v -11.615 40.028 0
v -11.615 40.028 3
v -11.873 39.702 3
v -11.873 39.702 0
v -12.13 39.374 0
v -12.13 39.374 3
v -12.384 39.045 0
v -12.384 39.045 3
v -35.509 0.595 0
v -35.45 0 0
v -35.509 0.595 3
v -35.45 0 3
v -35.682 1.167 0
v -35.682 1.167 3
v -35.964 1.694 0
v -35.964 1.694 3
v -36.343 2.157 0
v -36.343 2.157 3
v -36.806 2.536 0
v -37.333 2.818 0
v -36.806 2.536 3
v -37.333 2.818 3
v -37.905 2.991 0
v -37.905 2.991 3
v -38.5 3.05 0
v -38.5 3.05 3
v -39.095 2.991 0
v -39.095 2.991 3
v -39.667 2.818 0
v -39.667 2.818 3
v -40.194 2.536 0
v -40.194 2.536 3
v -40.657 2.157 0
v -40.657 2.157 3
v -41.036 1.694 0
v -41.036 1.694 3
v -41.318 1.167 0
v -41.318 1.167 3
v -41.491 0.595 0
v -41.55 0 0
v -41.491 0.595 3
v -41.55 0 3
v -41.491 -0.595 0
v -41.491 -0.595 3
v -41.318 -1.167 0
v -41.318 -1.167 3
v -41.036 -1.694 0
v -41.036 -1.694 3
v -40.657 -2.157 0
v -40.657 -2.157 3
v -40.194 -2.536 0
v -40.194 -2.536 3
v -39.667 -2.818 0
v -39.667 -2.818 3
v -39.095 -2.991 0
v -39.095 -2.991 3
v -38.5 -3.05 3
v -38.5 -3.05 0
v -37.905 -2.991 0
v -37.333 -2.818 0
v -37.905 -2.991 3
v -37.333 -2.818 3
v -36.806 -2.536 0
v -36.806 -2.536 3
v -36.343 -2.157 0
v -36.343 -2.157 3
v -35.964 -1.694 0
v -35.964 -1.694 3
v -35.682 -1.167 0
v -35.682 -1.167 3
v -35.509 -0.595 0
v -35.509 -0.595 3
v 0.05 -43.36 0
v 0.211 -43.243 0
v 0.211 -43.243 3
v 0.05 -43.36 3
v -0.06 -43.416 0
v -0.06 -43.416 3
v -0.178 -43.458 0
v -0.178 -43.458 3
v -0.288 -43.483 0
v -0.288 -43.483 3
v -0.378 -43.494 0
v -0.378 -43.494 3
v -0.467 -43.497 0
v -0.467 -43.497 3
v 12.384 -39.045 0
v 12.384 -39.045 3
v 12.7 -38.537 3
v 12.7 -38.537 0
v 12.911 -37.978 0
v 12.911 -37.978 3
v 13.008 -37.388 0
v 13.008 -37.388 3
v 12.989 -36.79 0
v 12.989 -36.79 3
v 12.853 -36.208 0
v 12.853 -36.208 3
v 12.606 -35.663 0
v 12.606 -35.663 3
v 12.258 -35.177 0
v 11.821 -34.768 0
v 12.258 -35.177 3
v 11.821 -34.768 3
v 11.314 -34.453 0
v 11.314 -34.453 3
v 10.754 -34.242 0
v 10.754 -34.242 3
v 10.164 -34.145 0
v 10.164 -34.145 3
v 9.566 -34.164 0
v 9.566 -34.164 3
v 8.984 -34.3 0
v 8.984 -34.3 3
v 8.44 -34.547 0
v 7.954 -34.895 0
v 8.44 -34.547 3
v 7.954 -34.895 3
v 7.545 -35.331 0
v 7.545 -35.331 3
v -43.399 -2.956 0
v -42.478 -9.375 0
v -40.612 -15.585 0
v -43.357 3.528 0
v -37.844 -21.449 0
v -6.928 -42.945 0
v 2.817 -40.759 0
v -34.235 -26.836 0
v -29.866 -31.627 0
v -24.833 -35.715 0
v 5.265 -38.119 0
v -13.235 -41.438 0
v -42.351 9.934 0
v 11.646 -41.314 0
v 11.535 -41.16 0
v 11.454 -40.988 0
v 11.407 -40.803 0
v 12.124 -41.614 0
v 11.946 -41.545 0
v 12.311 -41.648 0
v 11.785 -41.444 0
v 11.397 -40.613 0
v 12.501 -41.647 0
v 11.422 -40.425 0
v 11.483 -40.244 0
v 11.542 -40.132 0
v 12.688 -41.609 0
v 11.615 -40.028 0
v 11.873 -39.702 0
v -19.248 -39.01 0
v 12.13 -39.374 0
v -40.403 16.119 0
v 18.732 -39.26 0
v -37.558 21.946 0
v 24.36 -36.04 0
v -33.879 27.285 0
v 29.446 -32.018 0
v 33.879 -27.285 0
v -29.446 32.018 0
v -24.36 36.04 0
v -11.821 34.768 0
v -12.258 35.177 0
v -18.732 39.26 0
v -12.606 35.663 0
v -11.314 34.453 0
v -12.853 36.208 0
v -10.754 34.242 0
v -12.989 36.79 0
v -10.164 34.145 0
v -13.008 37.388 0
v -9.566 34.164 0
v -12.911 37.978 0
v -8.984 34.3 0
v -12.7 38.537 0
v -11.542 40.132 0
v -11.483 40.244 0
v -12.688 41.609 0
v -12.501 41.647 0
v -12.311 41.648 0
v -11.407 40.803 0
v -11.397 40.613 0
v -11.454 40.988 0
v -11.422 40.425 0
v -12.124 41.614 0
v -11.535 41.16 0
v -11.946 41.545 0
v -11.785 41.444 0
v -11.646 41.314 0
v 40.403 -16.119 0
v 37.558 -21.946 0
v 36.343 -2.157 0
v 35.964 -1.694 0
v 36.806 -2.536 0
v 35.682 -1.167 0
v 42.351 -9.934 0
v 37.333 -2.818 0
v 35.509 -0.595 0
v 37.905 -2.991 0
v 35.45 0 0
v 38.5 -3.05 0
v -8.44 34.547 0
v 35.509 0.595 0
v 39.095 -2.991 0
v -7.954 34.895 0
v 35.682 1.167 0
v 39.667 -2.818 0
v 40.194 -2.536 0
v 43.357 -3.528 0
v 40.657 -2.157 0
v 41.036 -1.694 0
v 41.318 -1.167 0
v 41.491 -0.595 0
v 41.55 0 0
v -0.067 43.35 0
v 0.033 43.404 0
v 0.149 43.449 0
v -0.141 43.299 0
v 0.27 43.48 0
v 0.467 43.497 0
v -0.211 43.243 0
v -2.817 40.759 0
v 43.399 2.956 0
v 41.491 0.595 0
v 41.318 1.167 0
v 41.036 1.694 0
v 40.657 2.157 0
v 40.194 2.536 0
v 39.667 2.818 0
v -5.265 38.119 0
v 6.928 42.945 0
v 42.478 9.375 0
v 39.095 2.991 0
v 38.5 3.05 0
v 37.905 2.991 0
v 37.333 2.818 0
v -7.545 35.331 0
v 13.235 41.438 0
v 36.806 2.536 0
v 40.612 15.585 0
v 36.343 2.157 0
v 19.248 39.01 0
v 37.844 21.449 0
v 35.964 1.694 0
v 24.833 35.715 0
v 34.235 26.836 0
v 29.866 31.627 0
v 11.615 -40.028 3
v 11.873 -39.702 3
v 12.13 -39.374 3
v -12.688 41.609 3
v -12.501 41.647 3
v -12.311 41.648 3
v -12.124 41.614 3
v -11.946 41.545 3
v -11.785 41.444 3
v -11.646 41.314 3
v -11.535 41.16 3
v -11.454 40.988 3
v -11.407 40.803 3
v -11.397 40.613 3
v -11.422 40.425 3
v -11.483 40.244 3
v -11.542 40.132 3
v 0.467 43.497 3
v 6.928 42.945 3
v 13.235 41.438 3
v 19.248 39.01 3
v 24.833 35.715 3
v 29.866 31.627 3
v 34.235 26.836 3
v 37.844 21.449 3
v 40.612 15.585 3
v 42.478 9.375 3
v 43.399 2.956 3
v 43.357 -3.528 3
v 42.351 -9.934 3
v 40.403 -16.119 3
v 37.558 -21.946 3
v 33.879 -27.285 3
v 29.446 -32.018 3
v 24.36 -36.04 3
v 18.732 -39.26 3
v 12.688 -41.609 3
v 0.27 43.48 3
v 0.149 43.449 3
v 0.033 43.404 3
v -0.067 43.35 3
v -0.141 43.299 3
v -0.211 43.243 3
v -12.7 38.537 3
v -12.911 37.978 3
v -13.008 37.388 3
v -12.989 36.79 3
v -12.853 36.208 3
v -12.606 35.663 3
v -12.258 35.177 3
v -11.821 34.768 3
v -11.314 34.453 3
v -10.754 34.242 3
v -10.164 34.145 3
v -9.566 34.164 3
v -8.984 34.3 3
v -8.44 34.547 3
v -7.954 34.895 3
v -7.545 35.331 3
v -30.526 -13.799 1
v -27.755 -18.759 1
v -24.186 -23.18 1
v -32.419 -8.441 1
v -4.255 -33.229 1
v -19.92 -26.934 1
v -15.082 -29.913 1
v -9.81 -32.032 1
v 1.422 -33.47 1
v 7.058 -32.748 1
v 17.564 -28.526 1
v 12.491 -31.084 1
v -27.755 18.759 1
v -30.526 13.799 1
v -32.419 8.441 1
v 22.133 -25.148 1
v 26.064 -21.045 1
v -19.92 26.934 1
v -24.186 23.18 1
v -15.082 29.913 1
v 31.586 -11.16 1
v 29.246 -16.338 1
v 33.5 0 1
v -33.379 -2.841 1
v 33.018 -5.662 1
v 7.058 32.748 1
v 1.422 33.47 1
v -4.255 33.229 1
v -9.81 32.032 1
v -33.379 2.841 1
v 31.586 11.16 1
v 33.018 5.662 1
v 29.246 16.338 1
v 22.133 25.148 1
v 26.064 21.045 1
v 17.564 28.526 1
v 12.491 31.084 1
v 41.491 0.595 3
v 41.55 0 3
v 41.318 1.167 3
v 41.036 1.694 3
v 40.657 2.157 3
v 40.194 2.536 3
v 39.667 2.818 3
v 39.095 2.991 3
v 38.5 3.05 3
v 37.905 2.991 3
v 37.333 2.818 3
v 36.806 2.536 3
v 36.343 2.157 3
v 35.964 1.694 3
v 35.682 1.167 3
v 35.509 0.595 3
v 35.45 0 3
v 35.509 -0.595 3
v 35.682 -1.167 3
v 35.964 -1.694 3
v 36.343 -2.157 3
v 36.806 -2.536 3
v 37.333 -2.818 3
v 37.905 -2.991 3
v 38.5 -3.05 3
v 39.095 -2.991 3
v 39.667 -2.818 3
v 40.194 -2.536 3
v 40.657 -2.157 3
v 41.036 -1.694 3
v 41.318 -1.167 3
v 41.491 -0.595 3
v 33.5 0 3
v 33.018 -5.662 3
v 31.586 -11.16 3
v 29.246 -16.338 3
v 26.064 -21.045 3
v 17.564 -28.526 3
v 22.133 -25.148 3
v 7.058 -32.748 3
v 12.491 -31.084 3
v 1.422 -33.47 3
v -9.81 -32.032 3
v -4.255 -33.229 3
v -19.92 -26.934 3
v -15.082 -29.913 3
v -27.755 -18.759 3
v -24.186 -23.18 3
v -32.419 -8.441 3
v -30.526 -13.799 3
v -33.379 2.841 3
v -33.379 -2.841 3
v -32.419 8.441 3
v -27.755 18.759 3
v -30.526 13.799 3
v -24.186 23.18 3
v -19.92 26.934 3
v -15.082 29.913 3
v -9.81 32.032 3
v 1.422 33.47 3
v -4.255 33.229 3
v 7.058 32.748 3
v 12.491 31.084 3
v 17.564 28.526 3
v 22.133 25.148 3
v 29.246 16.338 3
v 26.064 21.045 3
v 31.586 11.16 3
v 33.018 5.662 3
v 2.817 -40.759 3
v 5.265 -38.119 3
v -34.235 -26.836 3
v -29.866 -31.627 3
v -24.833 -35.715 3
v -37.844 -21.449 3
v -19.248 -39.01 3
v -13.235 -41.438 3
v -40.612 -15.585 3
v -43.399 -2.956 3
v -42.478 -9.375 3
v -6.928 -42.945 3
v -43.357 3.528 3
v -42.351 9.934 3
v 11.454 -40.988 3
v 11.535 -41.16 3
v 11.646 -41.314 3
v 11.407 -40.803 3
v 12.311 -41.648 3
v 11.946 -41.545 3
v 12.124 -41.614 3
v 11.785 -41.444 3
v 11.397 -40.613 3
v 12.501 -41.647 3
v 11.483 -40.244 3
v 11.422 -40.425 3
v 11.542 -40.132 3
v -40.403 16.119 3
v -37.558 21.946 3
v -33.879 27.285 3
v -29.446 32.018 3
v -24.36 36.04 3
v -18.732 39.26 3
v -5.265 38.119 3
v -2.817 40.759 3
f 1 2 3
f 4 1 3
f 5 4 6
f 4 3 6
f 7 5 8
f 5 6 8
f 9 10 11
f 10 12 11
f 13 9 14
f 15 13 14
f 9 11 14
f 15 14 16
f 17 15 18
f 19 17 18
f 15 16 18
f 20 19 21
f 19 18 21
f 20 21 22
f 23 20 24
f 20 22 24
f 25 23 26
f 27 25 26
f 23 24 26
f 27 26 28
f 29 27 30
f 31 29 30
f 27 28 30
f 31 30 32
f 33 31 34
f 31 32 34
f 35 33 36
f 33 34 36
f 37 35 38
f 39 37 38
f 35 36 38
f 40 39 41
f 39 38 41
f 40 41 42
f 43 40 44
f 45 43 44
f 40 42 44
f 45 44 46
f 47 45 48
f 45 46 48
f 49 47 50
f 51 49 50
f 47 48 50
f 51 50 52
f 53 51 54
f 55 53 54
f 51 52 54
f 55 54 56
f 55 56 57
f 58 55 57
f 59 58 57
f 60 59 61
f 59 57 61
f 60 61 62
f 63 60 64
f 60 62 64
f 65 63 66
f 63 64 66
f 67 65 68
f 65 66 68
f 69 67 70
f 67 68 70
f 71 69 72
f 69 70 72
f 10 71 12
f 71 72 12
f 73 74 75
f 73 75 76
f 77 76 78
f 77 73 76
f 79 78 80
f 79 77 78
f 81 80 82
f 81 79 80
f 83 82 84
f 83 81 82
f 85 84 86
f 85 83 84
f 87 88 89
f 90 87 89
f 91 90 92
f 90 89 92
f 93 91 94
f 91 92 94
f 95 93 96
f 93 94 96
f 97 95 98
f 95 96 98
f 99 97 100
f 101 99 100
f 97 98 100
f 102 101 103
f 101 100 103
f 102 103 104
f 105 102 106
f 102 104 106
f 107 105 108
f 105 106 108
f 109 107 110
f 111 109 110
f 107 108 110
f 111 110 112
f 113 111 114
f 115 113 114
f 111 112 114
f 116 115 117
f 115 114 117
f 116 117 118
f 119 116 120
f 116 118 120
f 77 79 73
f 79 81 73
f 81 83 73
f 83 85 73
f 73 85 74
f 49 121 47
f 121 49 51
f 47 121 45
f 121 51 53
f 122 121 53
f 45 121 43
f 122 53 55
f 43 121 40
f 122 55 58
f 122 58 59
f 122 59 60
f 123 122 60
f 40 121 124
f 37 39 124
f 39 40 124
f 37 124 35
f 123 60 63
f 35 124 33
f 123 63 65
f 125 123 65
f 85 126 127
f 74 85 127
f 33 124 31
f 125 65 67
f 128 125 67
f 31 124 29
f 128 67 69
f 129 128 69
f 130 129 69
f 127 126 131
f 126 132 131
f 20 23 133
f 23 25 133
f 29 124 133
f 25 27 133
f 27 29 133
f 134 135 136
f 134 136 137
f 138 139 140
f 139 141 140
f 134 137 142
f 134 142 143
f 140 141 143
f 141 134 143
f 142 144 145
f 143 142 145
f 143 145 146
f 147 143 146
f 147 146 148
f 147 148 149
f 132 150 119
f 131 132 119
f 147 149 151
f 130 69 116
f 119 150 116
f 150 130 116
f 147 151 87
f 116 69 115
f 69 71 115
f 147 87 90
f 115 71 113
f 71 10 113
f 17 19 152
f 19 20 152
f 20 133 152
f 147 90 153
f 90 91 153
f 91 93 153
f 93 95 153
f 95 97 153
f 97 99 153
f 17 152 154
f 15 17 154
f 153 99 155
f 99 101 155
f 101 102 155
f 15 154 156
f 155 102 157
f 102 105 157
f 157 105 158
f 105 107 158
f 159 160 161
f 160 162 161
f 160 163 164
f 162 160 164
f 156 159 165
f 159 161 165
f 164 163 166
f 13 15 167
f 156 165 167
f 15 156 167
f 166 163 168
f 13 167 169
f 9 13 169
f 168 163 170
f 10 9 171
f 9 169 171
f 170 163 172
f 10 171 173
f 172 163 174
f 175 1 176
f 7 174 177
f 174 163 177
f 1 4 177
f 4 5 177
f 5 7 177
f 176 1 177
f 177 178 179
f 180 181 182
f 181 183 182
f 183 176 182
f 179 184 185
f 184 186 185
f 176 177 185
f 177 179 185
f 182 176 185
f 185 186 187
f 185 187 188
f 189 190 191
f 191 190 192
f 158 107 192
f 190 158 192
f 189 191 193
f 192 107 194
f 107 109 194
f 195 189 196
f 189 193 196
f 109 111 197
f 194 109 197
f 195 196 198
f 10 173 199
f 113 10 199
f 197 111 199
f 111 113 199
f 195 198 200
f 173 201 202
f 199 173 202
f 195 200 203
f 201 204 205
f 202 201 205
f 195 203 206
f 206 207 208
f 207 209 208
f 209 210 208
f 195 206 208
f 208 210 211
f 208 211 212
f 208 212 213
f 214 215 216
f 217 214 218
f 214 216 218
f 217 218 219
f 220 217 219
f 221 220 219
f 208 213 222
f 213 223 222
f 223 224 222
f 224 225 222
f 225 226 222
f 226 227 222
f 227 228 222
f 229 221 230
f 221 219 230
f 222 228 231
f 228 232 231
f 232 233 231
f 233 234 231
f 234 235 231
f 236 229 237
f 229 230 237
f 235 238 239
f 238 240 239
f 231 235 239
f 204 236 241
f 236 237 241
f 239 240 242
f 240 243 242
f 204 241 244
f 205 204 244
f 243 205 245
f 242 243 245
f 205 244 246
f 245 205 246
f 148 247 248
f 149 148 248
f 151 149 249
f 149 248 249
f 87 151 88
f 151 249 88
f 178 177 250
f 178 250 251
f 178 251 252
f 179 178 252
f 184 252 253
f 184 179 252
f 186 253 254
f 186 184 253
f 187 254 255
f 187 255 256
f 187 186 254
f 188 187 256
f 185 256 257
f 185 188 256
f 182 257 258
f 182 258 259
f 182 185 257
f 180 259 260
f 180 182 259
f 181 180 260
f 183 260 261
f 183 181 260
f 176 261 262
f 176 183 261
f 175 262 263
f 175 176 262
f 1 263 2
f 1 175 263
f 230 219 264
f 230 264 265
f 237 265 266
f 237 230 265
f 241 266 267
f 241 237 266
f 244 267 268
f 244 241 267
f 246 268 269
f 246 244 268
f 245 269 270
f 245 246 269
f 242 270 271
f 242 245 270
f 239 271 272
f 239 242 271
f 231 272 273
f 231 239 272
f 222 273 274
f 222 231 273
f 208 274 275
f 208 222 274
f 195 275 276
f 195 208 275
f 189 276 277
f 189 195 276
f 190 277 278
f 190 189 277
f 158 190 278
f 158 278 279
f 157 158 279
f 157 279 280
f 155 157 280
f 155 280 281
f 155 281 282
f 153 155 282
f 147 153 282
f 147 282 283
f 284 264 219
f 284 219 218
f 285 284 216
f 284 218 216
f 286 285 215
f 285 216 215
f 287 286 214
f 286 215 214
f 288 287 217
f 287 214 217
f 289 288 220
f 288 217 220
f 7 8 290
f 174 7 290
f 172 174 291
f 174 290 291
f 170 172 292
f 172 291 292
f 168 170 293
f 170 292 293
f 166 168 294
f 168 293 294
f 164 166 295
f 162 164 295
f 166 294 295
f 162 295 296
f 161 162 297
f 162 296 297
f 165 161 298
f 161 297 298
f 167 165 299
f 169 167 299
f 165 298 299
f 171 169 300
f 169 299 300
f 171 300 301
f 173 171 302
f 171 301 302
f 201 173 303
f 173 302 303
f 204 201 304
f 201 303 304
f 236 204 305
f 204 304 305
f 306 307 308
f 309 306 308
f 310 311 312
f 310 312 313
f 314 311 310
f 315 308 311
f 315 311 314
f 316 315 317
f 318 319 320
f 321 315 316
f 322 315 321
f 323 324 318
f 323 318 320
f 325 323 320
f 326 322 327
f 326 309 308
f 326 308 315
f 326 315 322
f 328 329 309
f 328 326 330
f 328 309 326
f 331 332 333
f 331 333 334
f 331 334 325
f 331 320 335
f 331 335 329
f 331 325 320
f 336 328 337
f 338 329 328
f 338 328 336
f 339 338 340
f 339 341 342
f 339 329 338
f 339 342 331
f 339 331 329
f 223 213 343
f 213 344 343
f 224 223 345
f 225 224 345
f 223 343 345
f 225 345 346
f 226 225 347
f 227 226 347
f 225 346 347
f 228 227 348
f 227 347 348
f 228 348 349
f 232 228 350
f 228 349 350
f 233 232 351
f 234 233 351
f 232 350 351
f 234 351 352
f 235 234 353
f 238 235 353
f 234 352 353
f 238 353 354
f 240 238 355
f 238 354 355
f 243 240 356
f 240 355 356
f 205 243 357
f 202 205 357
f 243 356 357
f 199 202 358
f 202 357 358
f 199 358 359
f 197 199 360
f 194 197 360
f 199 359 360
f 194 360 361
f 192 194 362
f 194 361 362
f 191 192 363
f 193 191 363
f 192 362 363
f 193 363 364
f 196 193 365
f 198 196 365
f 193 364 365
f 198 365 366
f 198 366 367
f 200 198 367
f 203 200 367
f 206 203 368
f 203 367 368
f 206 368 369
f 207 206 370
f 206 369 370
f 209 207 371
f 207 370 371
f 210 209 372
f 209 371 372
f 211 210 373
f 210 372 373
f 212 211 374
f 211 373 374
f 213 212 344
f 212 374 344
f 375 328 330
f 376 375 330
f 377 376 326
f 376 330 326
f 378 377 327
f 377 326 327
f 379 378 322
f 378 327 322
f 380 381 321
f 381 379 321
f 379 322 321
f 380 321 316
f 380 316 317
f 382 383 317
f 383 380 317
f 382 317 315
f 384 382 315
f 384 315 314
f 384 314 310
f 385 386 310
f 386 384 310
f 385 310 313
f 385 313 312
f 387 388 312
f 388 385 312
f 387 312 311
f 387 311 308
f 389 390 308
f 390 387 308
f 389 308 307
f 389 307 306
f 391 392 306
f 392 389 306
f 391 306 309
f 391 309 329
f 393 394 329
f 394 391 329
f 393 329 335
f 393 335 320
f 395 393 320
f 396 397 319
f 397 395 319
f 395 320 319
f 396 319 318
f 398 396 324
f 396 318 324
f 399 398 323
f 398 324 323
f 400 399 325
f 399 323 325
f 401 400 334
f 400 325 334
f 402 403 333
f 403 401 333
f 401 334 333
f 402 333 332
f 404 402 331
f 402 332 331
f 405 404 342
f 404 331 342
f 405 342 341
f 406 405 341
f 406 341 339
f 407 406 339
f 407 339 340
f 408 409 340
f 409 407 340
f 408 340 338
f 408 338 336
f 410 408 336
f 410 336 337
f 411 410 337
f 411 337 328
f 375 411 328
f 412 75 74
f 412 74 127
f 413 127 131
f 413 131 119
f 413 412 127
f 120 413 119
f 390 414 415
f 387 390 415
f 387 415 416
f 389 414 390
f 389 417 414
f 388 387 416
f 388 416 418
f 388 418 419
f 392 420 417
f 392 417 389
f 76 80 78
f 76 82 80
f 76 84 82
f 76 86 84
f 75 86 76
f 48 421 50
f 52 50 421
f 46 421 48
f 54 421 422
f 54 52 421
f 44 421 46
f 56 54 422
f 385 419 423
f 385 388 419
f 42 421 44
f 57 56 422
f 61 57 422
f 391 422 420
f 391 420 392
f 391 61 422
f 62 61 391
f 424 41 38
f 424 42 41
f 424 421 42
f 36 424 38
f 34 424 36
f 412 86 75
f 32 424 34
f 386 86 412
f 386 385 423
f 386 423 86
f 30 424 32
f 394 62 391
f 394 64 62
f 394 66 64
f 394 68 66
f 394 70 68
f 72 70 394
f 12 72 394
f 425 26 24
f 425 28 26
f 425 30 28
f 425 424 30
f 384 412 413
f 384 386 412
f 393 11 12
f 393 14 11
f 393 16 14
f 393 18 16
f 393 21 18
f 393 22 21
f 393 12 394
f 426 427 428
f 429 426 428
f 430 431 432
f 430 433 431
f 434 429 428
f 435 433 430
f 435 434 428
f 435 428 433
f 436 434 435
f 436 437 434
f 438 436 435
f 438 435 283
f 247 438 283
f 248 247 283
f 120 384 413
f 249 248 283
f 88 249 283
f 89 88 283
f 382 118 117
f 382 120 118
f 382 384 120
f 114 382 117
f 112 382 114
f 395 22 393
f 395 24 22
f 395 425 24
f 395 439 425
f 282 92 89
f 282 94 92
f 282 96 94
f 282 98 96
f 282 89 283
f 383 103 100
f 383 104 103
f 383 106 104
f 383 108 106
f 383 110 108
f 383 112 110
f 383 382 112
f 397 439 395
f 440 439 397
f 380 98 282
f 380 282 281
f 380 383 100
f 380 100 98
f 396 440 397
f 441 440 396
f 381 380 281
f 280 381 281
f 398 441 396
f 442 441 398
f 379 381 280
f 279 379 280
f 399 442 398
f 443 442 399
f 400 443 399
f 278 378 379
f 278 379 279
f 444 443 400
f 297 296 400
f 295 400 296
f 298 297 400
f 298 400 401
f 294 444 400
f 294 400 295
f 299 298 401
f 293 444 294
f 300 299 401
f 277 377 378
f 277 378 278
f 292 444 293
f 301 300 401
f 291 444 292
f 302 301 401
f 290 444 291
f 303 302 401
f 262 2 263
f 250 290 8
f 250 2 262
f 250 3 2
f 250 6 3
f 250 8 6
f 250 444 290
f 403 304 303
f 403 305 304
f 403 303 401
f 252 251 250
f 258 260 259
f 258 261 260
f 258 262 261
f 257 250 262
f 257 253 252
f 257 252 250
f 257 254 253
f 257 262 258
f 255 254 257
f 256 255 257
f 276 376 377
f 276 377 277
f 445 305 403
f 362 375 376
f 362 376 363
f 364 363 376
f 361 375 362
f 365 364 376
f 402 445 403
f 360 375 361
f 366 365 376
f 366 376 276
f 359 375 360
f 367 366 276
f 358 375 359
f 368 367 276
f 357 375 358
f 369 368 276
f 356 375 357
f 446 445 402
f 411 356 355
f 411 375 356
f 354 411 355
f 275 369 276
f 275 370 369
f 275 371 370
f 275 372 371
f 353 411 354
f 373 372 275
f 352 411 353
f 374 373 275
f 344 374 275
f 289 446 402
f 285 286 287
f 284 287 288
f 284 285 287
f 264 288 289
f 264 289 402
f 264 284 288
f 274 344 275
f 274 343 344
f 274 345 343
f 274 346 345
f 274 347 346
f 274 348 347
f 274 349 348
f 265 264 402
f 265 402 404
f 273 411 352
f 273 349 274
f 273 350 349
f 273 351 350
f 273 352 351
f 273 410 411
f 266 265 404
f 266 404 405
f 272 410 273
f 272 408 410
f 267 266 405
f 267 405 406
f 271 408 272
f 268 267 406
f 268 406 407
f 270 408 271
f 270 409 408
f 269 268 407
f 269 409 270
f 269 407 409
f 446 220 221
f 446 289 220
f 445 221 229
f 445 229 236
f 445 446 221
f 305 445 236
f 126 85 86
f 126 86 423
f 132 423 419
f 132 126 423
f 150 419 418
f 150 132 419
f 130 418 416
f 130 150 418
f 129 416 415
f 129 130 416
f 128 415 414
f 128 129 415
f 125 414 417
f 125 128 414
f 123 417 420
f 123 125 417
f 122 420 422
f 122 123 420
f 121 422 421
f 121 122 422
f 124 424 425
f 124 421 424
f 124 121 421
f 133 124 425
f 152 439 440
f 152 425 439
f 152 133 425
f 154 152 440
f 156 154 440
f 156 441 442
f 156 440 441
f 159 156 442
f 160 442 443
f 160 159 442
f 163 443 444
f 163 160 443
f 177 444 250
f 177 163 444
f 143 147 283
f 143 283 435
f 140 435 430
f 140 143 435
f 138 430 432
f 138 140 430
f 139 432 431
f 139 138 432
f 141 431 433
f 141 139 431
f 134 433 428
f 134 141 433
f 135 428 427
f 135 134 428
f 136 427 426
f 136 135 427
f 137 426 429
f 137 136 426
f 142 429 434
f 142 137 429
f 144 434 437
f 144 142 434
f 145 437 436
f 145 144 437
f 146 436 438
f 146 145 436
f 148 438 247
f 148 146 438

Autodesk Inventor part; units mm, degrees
ref_plane "YZ Plane" through (0, 0, 0) normal (1, 0, 0) x (0, 1, 0)
ref_plane "XZ Plane" through (0, 0, 0) normal (0, 1, 0) x (-1, 0, 0)
ref_plane "XY Plane" through (0, 0, 0) normal (0, 0, 1) x (1, 0, 0)
sketch "スケッチ1" plane through (0, 0, 0) normal (0, 0, 1) x (1, 0, 0)
  circle A0 centre (0, 0) radius 33.5 construction
  circle A1 centre (0, 0) radius 43.5
  dimension "d0" = 67
  dimension "d1" = 87
extrude "押し出し1" add sketch "スケッチ1" along normal blind 1
sketch "スケッチ2" plane through (0, 0, 1) normal (0, 0, 1) x (1, 0, 0)
  circle A0 centre (0, 0) radius 33.5
  circle A1 centre (0, 0) radius 43.5 projected
  dimension "d4" = 67
extrude "押し出し2" add sketch "スケッチ2" along normal blind 2
sketch "スケッチ4" plane through (0, 0, 3) normal (0, 0, 1) x (1, 0, 0)
  circle A0 centre (0, 0) radius 33.5 construction
  circle A1 centre (0, 0) radius 43.5 construction
  line L0 (0, 0) -> (33.5, 0) construction
  line L1 (33.5, 0) -> (43.5, 0) construction
  circle A2 centre (0, 0) radius 33.5 construction
  line L2 (0, 0) -> (-33.5, 0) construction
  circle A3 centre (0, 0) radius 43.5 construction
  line L3 (-43.5, 0) -> (-33.5, 0) construction
  circle A4 centre (38.5, 0) radius 3.05
  circle A5 centre (-38.5, 0) radius 3.05
  circle A6 centre (0, 0) radius 38.5 construction
  circle A7 centre (-9.9645, 37.1881) radius 3.05 construction
  arc A8 (-3.4944, 44.3648) -> (-9.9645, 37.1881) centre (38.5, 0) ccw construction
  line L4 (38.5, 0) -> (-9.9645, 37.1881) construction
  line L5 (-9.9645, 37.1881) -> (-12.3843, 39.0449) construction
  arc A9 (0.0788, 43.4999) -> (-7.5448, 35.3314) centre (38.5, 0) ccw
  arc A10 (-9.6001, 42.4274) -> (-12.3843, 39.0449) centre (38.5, 0) ccw
  arc A11 (-12.3843, 39.0449) -> (-7.5448, 35.3314) centre (-9.9645, 37.1881) ccw
  arc A12 (0.0788, 43.4999) -> (-9.6001, 42.4274) centre (0, 0) ccw
  circle A13 centre (9.9645, -37.1881) radius 3.05 construction
  line L6 (-38.5, 0) -> (9.9645, -37.1881) construction
  line L7 (9.9645, -37.1881) -> (12.3843, -39.0449) construction
  arc A14 (-0.0788, -43.4999) -> (7.5448, -35.3314) centre (-38.5, 0) ccw
  arc A15 (9.6001, -42.4274) -> (12.3843, -39.0449) centre (-38.5, 0) ccw
  arc A16 (12.3843, -39.0449) -> (7.5448, -35.3314) centre (9.9645, -37.1881) ccw
  arc A17 (-0.0788, -43.4999) -> (9.6001, -42.4274) centre (0, 0) ccw
  line L8 (-9.9645, 37.1881) -> (9.9645, -37.1881) construction
  dimension "d7" = 6.1
  dimension "d8" = 3.05
  dimension "d15" = 105
extrude "押し出し3" cut sketch "スケッチ4" against normal through all
fillet "フィレット1" radius 1 4 edges at (-9.6001, 42.4274, 1.5) (0.0788, 43.4999, 1.5) (-0.0788, -43.4999, 1.5) (9.6001, -42.4274, 1.5)
properties part number "kanure_01"
